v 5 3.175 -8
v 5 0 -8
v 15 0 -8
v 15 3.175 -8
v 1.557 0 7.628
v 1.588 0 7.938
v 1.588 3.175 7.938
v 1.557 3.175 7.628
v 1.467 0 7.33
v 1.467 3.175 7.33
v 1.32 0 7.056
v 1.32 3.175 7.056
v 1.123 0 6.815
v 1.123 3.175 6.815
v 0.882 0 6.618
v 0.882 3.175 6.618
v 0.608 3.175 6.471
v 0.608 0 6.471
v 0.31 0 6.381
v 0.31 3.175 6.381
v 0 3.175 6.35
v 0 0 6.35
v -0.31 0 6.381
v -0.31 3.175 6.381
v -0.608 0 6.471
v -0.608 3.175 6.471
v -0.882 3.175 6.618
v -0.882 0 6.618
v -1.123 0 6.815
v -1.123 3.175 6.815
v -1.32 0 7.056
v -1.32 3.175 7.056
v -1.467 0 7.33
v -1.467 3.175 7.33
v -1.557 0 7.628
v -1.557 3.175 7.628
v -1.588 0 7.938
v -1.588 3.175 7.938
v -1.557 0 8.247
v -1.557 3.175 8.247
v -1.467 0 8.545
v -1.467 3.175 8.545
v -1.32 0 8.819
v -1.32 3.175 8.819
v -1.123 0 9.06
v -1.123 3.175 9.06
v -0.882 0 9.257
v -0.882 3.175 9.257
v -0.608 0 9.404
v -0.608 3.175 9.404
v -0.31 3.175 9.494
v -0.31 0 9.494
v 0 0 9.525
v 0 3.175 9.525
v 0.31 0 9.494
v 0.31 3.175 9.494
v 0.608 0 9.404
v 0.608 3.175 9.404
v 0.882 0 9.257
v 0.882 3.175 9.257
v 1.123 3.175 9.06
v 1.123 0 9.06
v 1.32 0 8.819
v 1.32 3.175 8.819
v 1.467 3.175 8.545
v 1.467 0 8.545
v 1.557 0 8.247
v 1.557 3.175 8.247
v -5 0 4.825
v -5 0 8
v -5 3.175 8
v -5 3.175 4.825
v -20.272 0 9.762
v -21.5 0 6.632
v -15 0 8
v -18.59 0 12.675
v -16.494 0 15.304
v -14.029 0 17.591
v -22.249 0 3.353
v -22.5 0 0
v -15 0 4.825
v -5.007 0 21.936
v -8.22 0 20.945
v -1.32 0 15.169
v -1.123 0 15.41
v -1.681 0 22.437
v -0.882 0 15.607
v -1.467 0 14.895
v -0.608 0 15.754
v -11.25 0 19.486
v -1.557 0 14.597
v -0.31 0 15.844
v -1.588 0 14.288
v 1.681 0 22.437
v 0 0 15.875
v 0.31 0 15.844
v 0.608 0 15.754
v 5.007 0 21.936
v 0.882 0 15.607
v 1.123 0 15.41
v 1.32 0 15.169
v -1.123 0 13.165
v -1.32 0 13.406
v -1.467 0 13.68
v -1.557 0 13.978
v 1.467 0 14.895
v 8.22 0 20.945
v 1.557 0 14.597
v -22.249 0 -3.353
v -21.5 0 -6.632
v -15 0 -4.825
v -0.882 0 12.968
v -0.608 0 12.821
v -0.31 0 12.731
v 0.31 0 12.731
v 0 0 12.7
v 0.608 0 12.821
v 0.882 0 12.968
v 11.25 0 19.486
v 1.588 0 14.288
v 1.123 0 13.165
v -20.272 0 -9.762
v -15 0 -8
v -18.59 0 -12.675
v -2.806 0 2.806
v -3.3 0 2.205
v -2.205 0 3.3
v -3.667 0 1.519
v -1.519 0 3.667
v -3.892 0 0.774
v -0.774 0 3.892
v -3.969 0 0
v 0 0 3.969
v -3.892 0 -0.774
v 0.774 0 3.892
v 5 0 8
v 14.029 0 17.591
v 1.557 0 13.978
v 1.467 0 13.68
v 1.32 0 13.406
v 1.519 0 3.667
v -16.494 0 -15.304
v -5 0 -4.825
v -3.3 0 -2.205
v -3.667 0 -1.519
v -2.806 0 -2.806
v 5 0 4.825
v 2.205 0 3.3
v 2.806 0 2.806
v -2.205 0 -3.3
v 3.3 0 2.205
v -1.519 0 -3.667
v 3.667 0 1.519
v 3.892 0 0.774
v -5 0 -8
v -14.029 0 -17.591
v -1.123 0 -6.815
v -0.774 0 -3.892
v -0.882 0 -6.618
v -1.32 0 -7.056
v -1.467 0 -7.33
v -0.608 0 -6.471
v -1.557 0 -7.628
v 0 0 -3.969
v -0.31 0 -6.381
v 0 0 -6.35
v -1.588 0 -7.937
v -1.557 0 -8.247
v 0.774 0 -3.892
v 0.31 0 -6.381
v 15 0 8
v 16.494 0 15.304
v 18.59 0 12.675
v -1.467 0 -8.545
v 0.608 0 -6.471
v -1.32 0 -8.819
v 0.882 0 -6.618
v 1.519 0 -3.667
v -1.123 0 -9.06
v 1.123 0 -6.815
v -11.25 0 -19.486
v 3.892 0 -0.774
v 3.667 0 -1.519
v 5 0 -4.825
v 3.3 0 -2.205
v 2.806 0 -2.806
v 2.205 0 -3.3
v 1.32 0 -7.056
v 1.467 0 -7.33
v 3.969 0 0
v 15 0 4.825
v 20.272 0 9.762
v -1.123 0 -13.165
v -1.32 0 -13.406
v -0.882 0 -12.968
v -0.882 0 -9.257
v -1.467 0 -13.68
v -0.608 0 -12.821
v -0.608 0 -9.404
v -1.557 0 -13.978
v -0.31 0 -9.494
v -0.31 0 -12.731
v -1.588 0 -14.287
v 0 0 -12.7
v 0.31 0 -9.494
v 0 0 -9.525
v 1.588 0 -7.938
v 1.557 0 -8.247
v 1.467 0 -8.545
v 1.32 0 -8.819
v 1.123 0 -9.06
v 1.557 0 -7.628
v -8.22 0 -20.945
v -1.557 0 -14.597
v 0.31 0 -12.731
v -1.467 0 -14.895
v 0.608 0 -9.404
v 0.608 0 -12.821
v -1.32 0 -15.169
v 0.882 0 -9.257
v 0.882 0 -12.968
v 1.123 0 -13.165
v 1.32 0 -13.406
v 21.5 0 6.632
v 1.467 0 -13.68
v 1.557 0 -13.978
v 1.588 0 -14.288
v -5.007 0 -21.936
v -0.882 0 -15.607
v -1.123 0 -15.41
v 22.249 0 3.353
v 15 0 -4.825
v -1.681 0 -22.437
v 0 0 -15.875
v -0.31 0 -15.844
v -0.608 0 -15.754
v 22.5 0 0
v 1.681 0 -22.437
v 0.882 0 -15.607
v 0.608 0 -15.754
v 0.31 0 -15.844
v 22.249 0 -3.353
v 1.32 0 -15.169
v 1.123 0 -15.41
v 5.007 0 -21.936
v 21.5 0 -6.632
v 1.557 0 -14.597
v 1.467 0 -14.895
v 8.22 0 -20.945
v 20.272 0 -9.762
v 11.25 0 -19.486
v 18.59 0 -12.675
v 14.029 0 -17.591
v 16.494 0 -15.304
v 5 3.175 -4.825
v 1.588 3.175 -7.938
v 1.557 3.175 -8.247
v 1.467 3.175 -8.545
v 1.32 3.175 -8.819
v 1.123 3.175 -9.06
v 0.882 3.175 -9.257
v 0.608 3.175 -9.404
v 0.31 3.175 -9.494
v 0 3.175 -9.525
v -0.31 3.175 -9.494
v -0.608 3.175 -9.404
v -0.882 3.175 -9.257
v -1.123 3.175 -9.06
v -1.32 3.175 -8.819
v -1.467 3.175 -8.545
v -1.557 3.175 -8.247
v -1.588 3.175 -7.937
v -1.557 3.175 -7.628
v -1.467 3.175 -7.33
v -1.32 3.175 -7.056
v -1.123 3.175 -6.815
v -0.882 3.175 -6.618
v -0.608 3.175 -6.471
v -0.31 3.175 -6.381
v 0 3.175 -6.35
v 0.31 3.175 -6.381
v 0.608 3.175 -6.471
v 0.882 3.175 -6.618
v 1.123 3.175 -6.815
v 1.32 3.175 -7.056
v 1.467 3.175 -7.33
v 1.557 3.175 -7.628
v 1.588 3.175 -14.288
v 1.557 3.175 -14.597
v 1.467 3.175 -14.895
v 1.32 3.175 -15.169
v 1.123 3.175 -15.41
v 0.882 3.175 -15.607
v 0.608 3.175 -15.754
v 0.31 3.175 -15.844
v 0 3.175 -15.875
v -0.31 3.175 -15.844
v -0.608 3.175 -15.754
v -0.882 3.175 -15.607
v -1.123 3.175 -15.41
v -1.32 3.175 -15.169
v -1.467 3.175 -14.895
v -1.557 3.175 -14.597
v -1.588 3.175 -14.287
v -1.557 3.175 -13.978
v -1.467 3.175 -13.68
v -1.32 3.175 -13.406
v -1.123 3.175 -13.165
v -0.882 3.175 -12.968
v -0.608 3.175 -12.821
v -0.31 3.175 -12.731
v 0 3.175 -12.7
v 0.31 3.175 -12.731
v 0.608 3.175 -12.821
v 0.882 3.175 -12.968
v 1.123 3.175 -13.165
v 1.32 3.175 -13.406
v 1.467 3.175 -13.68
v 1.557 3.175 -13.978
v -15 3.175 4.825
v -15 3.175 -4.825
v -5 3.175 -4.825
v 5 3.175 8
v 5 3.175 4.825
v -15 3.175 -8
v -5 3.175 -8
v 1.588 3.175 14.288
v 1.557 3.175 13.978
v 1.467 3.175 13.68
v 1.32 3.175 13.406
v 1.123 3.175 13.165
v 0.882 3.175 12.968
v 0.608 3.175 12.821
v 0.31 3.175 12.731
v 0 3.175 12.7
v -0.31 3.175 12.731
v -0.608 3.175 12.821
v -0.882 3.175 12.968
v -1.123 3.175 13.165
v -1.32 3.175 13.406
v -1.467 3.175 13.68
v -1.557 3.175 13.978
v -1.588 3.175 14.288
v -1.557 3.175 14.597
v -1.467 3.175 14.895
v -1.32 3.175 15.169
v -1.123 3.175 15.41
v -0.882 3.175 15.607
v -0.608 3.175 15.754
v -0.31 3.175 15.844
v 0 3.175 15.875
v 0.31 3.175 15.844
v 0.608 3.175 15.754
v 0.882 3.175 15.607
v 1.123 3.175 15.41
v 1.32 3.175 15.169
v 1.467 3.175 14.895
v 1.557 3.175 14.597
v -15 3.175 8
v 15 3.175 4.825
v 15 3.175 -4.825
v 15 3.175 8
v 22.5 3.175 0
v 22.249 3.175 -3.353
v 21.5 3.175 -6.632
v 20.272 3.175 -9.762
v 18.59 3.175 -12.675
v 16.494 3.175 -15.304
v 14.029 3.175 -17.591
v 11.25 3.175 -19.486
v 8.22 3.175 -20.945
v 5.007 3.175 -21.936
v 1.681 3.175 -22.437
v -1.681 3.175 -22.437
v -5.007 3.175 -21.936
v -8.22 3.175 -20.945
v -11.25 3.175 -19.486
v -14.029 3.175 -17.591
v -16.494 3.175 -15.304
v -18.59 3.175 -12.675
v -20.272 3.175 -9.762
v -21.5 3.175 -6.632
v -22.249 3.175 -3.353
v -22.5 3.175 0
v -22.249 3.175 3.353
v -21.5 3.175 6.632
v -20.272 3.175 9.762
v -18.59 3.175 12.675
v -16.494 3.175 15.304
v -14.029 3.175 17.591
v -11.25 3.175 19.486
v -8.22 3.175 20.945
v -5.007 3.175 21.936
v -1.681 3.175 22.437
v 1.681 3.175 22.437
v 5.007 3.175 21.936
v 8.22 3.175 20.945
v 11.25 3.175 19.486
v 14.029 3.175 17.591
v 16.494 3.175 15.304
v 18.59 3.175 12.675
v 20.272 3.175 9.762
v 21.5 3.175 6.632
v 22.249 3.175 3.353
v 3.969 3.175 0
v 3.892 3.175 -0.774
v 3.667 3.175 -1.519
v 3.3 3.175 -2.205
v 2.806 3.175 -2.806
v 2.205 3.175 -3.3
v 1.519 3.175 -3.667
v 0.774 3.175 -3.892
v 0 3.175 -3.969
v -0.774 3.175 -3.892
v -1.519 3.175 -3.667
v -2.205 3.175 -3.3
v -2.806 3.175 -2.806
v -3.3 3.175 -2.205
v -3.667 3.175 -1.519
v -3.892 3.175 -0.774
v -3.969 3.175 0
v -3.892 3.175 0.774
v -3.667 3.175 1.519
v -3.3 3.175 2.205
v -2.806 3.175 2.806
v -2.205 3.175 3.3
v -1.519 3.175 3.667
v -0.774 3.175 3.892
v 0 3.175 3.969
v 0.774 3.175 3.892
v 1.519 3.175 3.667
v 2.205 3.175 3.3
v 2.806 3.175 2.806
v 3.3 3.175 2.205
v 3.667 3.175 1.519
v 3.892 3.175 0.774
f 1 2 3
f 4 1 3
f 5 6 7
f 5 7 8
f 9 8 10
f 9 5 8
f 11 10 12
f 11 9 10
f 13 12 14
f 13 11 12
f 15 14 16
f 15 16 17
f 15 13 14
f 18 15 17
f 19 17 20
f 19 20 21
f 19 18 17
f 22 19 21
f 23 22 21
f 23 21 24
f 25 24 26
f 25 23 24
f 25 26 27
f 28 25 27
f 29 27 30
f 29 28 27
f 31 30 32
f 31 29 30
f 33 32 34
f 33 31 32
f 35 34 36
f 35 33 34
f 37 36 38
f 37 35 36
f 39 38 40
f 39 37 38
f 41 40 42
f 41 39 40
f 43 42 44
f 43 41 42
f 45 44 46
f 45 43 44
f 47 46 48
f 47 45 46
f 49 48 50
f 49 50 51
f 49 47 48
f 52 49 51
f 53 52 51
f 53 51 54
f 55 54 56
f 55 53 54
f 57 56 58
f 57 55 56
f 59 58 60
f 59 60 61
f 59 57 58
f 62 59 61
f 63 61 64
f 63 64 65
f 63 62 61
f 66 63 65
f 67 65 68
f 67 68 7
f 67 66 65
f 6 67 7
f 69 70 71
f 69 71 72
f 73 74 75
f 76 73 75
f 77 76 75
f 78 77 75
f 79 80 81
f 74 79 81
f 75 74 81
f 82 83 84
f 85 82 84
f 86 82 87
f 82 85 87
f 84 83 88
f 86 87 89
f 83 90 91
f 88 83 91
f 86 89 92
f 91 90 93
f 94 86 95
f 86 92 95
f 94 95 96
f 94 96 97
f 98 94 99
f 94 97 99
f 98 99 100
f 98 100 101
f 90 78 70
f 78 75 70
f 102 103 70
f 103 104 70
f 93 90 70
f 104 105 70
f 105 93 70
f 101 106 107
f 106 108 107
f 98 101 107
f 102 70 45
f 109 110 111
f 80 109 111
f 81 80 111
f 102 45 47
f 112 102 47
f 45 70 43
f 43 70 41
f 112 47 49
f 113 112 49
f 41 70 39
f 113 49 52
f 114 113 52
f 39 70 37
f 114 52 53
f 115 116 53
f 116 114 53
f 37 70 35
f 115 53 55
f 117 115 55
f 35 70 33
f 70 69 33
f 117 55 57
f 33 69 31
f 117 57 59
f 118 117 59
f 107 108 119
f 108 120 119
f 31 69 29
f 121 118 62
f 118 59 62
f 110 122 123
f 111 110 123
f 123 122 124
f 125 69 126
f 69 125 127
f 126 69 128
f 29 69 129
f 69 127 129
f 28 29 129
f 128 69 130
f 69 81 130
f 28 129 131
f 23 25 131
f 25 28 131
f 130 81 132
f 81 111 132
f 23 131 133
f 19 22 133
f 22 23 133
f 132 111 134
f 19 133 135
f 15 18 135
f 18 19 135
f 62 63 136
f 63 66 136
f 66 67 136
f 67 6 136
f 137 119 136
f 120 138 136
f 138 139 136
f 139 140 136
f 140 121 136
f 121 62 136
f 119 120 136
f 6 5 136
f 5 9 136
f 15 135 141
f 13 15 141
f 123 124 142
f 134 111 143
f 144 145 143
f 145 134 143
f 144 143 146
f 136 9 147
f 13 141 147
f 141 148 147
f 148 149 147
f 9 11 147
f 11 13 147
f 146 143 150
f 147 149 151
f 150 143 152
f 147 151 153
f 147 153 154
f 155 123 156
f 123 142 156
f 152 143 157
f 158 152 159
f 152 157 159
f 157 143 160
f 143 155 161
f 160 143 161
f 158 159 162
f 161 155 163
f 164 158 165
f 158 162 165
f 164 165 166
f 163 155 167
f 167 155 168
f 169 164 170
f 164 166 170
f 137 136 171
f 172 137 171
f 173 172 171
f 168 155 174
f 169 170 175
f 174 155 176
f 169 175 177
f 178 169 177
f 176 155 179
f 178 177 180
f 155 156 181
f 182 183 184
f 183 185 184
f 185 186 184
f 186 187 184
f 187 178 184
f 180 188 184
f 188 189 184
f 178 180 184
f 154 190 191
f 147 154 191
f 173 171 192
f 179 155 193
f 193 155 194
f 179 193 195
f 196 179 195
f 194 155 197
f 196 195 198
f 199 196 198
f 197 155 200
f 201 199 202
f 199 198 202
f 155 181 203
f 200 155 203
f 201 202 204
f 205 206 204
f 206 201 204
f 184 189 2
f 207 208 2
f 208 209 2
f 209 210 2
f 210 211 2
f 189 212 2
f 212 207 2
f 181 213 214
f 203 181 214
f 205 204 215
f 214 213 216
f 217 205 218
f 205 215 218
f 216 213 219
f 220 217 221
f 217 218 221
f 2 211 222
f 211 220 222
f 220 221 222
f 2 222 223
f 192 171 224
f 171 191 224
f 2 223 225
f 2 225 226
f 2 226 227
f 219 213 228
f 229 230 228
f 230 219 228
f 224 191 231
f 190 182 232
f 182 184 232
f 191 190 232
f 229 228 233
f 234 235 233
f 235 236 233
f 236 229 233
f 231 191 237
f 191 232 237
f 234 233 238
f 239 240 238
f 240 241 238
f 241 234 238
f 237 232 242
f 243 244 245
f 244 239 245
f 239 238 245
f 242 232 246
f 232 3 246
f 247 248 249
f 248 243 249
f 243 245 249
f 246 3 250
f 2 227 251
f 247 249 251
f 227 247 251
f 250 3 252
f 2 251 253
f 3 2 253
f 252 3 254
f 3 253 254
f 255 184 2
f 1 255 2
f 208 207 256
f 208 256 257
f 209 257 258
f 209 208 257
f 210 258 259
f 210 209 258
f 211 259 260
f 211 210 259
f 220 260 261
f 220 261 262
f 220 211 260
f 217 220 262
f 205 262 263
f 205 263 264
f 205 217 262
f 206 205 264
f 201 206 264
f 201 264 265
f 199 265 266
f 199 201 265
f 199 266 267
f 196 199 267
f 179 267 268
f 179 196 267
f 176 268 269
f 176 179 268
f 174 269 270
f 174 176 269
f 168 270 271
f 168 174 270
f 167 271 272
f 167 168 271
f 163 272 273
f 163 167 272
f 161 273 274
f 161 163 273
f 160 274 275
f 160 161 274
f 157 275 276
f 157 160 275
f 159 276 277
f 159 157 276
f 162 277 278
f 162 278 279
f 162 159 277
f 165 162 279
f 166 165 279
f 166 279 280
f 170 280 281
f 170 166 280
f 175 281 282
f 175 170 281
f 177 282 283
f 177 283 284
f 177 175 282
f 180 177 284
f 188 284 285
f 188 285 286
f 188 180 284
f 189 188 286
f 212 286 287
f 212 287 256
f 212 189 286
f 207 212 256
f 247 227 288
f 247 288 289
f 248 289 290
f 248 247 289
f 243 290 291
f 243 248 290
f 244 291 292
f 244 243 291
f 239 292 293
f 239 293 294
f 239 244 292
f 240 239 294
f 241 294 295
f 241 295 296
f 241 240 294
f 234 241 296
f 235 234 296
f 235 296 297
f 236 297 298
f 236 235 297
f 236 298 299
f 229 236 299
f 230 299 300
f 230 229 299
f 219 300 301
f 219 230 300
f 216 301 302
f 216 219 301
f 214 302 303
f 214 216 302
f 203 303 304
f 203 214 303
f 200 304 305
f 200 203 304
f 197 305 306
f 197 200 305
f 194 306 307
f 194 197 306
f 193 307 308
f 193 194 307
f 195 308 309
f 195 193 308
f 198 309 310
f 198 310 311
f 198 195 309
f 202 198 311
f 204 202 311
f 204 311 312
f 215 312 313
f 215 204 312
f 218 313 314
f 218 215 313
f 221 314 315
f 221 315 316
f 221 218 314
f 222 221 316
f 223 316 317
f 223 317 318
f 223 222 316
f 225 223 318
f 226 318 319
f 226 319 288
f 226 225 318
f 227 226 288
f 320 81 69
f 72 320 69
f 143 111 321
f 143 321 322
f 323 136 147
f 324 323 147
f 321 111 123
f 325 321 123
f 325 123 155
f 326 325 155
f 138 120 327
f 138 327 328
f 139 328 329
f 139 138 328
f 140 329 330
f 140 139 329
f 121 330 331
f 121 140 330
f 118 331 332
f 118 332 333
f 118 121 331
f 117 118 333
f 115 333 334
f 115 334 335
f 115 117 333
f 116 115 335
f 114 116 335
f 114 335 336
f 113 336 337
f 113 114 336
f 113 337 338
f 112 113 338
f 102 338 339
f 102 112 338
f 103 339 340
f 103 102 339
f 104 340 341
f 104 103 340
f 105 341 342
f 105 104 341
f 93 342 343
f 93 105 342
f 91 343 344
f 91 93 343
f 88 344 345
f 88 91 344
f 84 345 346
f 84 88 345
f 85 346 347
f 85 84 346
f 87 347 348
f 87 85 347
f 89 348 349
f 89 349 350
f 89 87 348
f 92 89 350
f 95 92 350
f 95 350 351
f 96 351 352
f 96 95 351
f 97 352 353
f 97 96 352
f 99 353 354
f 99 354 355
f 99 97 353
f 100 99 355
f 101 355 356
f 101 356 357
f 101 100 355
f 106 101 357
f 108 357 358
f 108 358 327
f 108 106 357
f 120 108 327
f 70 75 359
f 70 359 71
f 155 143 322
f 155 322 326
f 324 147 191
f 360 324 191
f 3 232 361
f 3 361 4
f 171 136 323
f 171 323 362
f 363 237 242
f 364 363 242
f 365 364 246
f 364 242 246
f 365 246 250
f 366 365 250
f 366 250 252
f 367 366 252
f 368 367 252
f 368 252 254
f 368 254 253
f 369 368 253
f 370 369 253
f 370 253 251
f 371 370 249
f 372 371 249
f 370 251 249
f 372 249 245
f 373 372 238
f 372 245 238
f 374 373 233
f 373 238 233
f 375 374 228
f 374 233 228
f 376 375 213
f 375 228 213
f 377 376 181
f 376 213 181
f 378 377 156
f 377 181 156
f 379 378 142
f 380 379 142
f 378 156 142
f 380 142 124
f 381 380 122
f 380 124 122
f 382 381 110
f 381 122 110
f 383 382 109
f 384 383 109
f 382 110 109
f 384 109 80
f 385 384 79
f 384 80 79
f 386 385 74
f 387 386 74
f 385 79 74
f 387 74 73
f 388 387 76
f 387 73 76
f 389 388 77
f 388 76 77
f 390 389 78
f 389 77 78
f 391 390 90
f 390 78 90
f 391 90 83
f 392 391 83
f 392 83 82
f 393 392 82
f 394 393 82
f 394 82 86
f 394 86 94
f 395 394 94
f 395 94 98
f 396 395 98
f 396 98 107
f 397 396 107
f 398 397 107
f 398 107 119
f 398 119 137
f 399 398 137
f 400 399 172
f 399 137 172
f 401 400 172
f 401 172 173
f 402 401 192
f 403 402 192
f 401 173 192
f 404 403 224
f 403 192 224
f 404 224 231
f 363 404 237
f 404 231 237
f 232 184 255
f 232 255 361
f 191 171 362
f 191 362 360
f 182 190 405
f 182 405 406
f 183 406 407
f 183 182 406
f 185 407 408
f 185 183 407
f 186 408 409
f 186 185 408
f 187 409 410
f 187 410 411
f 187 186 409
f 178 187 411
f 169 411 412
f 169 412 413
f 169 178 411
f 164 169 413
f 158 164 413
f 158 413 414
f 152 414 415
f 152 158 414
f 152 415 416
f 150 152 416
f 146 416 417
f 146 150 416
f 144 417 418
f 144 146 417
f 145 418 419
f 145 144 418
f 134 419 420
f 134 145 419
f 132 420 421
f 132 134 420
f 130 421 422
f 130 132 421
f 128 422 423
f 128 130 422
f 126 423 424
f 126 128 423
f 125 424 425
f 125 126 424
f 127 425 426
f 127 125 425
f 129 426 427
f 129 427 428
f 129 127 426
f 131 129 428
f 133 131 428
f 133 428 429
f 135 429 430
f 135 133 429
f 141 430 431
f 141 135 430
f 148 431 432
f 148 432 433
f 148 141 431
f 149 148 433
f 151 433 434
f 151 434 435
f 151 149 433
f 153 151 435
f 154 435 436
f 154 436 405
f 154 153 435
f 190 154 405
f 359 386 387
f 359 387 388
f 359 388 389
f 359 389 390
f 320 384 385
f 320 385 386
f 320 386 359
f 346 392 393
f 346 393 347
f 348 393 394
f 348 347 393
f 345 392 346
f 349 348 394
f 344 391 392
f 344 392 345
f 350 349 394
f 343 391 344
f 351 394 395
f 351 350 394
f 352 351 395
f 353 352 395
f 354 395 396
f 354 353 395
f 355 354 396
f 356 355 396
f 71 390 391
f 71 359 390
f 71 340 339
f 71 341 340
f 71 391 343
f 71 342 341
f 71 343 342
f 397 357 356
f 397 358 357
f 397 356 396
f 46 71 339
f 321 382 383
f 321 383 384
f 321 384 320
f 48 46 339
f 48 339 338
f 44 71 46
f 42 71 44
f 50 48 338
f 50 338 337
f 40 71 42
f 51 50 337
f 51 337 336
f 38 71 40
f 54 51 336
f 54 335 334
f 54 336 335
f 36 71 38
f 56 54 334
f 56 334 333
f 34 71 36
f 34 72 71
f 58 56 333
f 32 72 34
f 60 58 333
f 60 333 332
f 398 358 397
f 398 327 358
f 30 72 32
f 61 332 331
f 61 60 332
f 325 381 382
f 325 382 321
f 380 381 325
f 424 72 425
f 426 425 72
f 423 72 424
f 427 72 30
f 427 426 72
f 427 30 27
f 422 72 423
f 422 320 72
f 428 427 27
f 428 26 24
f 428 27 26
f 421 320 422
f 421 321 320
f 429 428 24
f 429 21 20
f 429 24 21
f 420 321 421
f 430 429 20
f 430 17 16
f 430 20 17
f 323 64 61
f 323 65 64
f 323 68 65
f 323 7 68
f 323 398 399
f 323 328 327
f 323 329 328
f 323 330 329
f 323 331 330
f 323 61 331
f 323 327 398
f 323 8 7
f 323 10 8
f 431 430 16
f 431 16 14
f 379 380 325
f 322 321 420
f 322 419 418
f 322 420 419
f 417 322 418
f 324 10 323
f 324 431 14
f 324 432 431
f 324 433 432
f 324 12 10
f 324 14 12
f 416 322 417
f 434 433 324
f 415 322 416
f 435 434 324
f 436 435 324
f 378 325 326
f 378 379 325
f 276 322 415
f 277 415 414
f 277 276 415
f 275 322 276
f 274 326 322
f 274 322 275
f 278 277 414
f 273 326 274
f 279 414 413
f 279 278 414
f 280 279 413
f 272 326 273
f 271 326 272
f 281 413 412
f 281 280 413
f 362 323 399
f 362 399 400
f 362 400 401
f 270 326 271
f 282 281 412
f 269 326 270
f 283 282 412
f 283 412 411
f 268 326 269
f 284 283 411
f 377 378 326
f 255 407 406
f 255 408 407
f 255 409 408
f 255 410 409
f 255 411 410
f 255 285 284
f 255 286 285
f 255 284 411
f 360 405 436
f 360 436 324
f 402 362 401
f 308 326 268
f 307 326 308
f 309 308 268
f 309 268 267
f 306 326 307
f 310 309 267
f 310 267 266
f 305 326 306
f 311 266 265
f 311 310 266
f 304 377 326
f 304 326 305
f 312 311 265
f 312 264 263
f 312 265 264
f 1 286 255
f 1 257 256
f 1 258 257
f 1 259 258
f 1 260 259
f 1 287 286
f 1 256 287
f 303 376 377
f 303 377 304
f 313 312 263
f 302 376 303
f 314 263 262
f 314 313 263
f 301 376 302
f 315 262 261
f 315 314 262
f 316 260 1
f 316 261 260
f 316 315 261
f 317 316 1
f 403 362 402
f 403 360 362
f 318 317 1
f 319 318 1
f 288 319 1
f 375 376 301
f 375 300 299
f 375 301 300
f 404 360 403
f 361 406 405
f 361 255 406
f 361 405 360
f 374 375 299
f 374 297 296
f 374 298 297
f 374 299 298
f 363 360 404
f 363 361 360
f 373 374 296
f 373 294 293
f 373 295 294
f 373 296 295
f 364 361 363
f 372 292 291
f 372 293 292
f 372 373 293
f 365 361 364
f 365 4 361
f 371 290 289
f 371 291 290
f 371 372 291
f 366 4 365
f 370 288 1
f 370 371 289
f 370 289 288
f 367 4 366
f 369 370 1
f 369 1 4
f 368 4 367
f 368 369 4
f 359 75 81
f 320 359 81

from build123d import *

# Parameters (mm, degrees)
CROQUIS1_R              = 22.5
CROQUIS1_R_2            = 3.96875
CROQUIS1_R_3            = 1.5875
CROQUIS1_W              = 10
CROQUIS1_H              = 3.175
SALIENTE_EXTRUIR1_DEPTH = 3.175


with BuildPart() as part:
    # Croquis1 → Saliente-Extruir1 (new body)
    with BuildSketch(Plane(origin=(0, 0, 0), x_dir=(1, 0, 0), z_dir=(0, 1, 0))):
        Circle(CROQUIS1_R)
        Circle(CROQUIS1_R_2, mode=Mode.SUBTRACT)
        with Locations((0, 7.9375)):
            Circle(CROQUIS1_R_3, mode=Mode.SUBTRACT)
        with Locations((0, -7.9375)):
            Circle(CROQUIS1_R_3, mode=Mode.SUBTRACT)
        with Locations((0, 14.2875)):
            Circle(CROQUIS1_R_3, mode=Mode.SUBTRACT)
        with Locations((0, -14.2875)):
            Circle(CROQUIS1_R_3, mode=Mode.SUBTRACT)
        with Locations((-10, 6.4125)):
            Rectangle(CROQUIS1_W, CROQUIS1_H, mode=Mode.SUBTRACT)
        with Locations((10, 6.4125)):
            Rectangle(CROQUIS1_W, CROQUIS1_H, mode=Mode.SUBTRACT)
        with Locations((-10, -6.4125)):
            Rectangle(CROQUIS1_W, CROQUIS1_H, mode=Mode.SUBTRACT)
        with Locations((10, -6.4125)):
            Rectangle(CROQUIS1_W, CROQUIS1_H, mode=Mode.SUBTRACT)
    extrude(amount=SALIENTE_EXTRUIR1_DEPTH)


solid = part.part
